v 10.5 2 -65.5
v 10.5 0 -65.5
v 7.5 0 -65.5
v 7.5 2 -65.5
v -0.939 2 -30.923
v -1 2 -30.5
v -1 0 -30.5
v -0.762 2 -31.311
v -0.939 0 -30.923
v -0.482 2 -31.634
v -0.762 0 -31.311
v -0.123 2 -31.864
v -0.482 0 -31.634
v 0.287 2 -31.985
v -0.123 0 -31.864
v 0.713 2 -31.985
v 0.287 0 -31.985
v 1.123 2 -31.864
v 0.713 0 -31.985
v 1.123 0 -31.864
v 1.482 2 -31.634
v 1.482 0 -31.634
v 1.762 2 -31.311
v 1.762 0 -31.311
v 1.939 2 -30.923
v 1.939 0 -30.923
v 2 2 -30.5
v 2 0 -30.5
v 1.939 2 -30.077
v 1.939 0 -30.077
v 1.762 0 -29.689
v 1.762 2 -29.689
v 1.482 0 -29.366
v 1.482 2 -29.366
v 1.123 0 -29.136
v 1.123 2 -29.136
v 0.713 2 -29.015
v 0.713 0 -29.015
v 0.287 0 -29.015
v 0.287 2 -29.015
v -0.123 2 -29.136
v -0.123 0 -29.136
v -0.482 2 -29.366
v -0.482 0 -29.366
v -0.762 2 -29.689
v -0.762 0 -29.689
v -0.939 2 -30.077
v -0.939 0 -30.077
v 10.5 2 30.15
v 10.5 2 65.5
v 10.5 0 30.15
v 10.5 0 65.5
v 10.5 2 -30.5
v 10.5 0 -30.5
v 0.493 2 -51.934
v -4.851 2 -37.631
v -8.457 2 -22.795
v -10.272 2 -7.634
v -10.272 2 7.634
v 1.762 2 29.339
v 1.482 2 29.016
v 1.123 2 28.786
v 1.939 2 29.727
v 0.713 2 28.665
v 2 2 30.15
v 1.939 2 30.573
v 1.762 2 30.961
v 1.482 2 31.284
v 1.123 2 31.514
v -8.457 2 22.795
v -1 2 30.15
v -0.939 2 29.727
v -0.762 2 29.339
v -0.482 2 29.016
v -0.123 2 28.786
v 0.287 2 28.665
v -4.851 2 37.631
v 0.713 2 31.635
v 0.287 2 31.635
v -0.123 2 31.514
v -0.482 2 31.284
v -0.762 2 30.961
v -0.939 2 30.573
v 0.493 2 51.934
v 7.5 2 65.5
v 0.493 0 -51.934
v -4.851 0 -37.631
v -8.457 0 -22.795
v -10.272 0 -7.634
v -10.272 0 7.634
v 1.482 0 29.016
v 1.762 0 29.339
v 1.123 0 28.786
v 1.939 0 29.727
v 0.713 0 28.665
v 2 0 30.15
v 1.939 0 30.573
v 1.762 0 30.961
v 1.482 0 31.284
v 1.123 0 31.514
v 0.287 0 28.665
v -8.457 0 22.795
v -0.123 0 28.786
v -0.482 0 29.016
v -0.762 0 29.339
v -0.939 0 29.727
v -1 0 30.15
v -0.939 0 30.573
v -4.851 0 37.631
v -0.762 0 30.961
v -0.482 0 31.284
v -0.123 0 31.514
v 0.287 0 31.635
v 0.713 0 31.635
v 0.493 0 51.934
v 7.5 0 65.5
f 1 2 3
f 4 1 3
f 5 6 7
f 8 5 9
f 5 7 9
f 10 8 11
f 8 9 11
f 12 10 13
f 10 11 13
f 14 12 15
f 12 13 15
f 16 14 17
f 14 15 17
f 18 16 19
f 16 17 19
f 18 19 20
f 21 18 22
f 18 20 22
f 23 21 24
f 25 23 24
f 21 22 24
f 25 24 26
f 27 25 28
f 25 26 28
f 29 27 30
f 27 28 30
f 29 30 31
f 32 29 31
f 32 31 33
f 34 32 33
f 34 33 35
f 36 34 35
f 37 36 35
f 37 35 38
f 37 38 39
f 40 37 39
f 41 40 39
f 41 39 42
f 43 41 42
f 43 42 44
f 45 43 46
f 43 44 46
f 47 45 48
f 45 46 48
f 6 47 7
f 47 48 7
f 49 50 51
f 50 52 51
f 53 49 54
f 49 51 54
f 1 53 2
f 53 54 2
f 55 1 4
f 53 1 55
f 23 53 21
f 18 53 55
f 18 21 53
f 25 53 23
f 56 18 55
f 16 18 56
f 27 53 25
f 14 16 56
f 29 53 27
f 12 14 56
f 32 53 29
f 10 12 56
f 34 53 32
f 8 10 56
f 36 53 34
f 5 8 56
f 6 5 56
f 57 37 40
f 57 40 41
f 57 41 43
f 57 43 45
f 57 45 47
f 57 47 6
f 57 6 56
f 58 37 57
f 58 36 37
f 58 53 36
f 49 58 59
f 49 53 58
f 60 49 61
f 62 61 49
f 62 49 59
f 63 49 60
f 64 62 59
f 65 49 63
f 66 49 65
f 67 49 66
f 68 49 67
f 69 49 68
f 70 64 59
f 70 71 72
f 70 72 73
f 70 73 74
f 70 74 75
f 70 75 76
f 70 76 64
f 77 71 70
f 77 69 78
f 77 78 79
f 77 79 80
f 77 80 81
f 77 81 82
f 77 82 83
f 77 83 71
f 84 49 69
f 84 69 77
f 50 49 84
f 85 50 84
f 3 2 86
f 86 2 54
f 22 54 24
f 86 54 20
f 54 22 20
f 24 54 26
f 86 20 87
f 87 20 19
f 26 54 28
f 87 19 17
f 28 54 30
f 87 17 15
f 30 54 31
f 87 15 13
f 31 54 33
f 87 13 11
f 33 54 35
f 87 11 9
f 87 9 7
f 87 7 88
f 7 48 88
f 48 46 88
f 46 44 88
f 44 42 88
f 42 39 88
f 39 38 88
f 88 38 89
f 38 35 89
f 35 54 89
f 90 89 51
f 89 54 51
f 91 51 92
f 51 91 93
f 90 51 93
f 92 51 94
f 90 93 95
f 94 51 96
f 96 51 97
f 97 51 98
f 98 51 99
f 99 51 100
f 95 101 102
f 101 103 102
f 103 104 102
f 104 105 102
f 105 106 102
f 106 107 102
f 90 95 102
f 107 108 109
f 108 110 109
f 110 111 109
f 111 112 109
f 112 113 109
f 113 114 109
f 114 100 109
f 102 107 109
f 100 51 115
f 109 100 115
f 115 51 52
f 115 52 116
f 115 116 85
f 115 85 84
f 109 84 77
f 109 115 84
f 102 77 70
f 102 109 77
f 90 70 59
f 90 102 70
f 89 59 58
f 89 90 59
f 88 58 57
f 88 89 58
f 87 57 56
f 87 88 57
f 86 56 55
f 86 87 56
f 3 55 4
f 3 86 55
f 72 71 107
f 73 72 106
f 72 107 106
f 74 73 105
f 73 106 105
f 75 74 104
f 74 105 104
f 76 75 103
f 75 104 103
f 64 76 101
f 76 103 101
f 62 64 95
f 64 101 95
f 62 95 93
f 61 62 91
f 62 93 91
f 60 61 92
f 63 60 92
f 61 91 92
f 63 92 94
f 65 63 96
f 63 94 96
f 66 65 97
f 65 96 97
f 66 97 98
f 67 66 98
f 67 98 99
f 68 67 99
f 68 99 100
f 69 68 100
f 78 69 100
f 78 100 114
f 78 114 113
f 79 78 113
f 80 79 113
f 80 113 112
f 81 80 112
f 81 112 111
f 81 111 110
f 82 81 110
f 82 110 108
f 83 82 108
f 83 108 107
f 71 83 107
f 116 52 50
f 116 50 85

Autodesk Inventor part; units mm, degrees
ref_plane "YZ Plane" through (0, 0, 0) normal (1, 0, 0) x (0, 1, 0)
ref_plane "XZ Plane" through (0, 0, 0) normal (0, 1, 0) x (-1, 0, 0)
ref_plane "XY Plane" through (0, 0, 0) normal (0, 0, 1) x (1, 0, 0)
sketch "Sketch1" plane through (0, 0, 0) normal (0, 1, 0) x (-1, 0, 0)
  line L0 (-10.5, 65.5) -> (-10.5, -65.5)
  line L1 (-10.5, 65.5) -> (-7.5, 65.5)
  line L2 (-10.5, -65.5) -> (-7.5, -65.5)
  arc A0 (-7.5, -65.5) -> (-7.5, 65.5) centre (-117.6736, 0) ccw
  line L3 (-7.5, 65.5) -> (-10.5, 65.5)
  line L4 (-10.5, 65.5) -> (-10.5, -65.5)
  line L5 (-10.5, -65.5) -> (-7.5, -65.5)
  line L6 (-10.5, -65.5) -> (-10.5, 65.5)
  line L7 (-10.5, -65.5) -> (-10.5, -30.5)
  line L8 (-10.5, 65.5) -> (-10.5, 30.15)
  line L9 (-10.5, 30.5) -> (-10.5, -30.5)
  line L10 (-10.5, 30.5) -> (-10.5, -30.5)
  circle A1 centre (-0.5, -30.5) radius 1.5
  line L11 (-0.5, -30.5) -> (-10.5, -30.5)
  line L12 (-10.5, -30.5) -> (-10.5, 30.15)
  line L13 (-10.5, 30.15) -> (-0.5, 30.15)
  circle A2 centre (-0.5, 30.15) radius 1.5
  point P0 (0, 0)
  dimension "d2" = 3
  dimension "d3" = 3
  dimension "d13" = 35
  dimension "d14" = 35.35
  dimension "d17" = 3
  dimension "d21" = 3
extrude "Extrusion1" add sketch "Sketch1" along normal blind 2 contours A2 | A1 | L1 A0 L2 L0
extrude "Extrusion3" cut sketch "Sketch1" along normal blind 2 contours A2 | A1
properties part number "naraznik_kryt"
